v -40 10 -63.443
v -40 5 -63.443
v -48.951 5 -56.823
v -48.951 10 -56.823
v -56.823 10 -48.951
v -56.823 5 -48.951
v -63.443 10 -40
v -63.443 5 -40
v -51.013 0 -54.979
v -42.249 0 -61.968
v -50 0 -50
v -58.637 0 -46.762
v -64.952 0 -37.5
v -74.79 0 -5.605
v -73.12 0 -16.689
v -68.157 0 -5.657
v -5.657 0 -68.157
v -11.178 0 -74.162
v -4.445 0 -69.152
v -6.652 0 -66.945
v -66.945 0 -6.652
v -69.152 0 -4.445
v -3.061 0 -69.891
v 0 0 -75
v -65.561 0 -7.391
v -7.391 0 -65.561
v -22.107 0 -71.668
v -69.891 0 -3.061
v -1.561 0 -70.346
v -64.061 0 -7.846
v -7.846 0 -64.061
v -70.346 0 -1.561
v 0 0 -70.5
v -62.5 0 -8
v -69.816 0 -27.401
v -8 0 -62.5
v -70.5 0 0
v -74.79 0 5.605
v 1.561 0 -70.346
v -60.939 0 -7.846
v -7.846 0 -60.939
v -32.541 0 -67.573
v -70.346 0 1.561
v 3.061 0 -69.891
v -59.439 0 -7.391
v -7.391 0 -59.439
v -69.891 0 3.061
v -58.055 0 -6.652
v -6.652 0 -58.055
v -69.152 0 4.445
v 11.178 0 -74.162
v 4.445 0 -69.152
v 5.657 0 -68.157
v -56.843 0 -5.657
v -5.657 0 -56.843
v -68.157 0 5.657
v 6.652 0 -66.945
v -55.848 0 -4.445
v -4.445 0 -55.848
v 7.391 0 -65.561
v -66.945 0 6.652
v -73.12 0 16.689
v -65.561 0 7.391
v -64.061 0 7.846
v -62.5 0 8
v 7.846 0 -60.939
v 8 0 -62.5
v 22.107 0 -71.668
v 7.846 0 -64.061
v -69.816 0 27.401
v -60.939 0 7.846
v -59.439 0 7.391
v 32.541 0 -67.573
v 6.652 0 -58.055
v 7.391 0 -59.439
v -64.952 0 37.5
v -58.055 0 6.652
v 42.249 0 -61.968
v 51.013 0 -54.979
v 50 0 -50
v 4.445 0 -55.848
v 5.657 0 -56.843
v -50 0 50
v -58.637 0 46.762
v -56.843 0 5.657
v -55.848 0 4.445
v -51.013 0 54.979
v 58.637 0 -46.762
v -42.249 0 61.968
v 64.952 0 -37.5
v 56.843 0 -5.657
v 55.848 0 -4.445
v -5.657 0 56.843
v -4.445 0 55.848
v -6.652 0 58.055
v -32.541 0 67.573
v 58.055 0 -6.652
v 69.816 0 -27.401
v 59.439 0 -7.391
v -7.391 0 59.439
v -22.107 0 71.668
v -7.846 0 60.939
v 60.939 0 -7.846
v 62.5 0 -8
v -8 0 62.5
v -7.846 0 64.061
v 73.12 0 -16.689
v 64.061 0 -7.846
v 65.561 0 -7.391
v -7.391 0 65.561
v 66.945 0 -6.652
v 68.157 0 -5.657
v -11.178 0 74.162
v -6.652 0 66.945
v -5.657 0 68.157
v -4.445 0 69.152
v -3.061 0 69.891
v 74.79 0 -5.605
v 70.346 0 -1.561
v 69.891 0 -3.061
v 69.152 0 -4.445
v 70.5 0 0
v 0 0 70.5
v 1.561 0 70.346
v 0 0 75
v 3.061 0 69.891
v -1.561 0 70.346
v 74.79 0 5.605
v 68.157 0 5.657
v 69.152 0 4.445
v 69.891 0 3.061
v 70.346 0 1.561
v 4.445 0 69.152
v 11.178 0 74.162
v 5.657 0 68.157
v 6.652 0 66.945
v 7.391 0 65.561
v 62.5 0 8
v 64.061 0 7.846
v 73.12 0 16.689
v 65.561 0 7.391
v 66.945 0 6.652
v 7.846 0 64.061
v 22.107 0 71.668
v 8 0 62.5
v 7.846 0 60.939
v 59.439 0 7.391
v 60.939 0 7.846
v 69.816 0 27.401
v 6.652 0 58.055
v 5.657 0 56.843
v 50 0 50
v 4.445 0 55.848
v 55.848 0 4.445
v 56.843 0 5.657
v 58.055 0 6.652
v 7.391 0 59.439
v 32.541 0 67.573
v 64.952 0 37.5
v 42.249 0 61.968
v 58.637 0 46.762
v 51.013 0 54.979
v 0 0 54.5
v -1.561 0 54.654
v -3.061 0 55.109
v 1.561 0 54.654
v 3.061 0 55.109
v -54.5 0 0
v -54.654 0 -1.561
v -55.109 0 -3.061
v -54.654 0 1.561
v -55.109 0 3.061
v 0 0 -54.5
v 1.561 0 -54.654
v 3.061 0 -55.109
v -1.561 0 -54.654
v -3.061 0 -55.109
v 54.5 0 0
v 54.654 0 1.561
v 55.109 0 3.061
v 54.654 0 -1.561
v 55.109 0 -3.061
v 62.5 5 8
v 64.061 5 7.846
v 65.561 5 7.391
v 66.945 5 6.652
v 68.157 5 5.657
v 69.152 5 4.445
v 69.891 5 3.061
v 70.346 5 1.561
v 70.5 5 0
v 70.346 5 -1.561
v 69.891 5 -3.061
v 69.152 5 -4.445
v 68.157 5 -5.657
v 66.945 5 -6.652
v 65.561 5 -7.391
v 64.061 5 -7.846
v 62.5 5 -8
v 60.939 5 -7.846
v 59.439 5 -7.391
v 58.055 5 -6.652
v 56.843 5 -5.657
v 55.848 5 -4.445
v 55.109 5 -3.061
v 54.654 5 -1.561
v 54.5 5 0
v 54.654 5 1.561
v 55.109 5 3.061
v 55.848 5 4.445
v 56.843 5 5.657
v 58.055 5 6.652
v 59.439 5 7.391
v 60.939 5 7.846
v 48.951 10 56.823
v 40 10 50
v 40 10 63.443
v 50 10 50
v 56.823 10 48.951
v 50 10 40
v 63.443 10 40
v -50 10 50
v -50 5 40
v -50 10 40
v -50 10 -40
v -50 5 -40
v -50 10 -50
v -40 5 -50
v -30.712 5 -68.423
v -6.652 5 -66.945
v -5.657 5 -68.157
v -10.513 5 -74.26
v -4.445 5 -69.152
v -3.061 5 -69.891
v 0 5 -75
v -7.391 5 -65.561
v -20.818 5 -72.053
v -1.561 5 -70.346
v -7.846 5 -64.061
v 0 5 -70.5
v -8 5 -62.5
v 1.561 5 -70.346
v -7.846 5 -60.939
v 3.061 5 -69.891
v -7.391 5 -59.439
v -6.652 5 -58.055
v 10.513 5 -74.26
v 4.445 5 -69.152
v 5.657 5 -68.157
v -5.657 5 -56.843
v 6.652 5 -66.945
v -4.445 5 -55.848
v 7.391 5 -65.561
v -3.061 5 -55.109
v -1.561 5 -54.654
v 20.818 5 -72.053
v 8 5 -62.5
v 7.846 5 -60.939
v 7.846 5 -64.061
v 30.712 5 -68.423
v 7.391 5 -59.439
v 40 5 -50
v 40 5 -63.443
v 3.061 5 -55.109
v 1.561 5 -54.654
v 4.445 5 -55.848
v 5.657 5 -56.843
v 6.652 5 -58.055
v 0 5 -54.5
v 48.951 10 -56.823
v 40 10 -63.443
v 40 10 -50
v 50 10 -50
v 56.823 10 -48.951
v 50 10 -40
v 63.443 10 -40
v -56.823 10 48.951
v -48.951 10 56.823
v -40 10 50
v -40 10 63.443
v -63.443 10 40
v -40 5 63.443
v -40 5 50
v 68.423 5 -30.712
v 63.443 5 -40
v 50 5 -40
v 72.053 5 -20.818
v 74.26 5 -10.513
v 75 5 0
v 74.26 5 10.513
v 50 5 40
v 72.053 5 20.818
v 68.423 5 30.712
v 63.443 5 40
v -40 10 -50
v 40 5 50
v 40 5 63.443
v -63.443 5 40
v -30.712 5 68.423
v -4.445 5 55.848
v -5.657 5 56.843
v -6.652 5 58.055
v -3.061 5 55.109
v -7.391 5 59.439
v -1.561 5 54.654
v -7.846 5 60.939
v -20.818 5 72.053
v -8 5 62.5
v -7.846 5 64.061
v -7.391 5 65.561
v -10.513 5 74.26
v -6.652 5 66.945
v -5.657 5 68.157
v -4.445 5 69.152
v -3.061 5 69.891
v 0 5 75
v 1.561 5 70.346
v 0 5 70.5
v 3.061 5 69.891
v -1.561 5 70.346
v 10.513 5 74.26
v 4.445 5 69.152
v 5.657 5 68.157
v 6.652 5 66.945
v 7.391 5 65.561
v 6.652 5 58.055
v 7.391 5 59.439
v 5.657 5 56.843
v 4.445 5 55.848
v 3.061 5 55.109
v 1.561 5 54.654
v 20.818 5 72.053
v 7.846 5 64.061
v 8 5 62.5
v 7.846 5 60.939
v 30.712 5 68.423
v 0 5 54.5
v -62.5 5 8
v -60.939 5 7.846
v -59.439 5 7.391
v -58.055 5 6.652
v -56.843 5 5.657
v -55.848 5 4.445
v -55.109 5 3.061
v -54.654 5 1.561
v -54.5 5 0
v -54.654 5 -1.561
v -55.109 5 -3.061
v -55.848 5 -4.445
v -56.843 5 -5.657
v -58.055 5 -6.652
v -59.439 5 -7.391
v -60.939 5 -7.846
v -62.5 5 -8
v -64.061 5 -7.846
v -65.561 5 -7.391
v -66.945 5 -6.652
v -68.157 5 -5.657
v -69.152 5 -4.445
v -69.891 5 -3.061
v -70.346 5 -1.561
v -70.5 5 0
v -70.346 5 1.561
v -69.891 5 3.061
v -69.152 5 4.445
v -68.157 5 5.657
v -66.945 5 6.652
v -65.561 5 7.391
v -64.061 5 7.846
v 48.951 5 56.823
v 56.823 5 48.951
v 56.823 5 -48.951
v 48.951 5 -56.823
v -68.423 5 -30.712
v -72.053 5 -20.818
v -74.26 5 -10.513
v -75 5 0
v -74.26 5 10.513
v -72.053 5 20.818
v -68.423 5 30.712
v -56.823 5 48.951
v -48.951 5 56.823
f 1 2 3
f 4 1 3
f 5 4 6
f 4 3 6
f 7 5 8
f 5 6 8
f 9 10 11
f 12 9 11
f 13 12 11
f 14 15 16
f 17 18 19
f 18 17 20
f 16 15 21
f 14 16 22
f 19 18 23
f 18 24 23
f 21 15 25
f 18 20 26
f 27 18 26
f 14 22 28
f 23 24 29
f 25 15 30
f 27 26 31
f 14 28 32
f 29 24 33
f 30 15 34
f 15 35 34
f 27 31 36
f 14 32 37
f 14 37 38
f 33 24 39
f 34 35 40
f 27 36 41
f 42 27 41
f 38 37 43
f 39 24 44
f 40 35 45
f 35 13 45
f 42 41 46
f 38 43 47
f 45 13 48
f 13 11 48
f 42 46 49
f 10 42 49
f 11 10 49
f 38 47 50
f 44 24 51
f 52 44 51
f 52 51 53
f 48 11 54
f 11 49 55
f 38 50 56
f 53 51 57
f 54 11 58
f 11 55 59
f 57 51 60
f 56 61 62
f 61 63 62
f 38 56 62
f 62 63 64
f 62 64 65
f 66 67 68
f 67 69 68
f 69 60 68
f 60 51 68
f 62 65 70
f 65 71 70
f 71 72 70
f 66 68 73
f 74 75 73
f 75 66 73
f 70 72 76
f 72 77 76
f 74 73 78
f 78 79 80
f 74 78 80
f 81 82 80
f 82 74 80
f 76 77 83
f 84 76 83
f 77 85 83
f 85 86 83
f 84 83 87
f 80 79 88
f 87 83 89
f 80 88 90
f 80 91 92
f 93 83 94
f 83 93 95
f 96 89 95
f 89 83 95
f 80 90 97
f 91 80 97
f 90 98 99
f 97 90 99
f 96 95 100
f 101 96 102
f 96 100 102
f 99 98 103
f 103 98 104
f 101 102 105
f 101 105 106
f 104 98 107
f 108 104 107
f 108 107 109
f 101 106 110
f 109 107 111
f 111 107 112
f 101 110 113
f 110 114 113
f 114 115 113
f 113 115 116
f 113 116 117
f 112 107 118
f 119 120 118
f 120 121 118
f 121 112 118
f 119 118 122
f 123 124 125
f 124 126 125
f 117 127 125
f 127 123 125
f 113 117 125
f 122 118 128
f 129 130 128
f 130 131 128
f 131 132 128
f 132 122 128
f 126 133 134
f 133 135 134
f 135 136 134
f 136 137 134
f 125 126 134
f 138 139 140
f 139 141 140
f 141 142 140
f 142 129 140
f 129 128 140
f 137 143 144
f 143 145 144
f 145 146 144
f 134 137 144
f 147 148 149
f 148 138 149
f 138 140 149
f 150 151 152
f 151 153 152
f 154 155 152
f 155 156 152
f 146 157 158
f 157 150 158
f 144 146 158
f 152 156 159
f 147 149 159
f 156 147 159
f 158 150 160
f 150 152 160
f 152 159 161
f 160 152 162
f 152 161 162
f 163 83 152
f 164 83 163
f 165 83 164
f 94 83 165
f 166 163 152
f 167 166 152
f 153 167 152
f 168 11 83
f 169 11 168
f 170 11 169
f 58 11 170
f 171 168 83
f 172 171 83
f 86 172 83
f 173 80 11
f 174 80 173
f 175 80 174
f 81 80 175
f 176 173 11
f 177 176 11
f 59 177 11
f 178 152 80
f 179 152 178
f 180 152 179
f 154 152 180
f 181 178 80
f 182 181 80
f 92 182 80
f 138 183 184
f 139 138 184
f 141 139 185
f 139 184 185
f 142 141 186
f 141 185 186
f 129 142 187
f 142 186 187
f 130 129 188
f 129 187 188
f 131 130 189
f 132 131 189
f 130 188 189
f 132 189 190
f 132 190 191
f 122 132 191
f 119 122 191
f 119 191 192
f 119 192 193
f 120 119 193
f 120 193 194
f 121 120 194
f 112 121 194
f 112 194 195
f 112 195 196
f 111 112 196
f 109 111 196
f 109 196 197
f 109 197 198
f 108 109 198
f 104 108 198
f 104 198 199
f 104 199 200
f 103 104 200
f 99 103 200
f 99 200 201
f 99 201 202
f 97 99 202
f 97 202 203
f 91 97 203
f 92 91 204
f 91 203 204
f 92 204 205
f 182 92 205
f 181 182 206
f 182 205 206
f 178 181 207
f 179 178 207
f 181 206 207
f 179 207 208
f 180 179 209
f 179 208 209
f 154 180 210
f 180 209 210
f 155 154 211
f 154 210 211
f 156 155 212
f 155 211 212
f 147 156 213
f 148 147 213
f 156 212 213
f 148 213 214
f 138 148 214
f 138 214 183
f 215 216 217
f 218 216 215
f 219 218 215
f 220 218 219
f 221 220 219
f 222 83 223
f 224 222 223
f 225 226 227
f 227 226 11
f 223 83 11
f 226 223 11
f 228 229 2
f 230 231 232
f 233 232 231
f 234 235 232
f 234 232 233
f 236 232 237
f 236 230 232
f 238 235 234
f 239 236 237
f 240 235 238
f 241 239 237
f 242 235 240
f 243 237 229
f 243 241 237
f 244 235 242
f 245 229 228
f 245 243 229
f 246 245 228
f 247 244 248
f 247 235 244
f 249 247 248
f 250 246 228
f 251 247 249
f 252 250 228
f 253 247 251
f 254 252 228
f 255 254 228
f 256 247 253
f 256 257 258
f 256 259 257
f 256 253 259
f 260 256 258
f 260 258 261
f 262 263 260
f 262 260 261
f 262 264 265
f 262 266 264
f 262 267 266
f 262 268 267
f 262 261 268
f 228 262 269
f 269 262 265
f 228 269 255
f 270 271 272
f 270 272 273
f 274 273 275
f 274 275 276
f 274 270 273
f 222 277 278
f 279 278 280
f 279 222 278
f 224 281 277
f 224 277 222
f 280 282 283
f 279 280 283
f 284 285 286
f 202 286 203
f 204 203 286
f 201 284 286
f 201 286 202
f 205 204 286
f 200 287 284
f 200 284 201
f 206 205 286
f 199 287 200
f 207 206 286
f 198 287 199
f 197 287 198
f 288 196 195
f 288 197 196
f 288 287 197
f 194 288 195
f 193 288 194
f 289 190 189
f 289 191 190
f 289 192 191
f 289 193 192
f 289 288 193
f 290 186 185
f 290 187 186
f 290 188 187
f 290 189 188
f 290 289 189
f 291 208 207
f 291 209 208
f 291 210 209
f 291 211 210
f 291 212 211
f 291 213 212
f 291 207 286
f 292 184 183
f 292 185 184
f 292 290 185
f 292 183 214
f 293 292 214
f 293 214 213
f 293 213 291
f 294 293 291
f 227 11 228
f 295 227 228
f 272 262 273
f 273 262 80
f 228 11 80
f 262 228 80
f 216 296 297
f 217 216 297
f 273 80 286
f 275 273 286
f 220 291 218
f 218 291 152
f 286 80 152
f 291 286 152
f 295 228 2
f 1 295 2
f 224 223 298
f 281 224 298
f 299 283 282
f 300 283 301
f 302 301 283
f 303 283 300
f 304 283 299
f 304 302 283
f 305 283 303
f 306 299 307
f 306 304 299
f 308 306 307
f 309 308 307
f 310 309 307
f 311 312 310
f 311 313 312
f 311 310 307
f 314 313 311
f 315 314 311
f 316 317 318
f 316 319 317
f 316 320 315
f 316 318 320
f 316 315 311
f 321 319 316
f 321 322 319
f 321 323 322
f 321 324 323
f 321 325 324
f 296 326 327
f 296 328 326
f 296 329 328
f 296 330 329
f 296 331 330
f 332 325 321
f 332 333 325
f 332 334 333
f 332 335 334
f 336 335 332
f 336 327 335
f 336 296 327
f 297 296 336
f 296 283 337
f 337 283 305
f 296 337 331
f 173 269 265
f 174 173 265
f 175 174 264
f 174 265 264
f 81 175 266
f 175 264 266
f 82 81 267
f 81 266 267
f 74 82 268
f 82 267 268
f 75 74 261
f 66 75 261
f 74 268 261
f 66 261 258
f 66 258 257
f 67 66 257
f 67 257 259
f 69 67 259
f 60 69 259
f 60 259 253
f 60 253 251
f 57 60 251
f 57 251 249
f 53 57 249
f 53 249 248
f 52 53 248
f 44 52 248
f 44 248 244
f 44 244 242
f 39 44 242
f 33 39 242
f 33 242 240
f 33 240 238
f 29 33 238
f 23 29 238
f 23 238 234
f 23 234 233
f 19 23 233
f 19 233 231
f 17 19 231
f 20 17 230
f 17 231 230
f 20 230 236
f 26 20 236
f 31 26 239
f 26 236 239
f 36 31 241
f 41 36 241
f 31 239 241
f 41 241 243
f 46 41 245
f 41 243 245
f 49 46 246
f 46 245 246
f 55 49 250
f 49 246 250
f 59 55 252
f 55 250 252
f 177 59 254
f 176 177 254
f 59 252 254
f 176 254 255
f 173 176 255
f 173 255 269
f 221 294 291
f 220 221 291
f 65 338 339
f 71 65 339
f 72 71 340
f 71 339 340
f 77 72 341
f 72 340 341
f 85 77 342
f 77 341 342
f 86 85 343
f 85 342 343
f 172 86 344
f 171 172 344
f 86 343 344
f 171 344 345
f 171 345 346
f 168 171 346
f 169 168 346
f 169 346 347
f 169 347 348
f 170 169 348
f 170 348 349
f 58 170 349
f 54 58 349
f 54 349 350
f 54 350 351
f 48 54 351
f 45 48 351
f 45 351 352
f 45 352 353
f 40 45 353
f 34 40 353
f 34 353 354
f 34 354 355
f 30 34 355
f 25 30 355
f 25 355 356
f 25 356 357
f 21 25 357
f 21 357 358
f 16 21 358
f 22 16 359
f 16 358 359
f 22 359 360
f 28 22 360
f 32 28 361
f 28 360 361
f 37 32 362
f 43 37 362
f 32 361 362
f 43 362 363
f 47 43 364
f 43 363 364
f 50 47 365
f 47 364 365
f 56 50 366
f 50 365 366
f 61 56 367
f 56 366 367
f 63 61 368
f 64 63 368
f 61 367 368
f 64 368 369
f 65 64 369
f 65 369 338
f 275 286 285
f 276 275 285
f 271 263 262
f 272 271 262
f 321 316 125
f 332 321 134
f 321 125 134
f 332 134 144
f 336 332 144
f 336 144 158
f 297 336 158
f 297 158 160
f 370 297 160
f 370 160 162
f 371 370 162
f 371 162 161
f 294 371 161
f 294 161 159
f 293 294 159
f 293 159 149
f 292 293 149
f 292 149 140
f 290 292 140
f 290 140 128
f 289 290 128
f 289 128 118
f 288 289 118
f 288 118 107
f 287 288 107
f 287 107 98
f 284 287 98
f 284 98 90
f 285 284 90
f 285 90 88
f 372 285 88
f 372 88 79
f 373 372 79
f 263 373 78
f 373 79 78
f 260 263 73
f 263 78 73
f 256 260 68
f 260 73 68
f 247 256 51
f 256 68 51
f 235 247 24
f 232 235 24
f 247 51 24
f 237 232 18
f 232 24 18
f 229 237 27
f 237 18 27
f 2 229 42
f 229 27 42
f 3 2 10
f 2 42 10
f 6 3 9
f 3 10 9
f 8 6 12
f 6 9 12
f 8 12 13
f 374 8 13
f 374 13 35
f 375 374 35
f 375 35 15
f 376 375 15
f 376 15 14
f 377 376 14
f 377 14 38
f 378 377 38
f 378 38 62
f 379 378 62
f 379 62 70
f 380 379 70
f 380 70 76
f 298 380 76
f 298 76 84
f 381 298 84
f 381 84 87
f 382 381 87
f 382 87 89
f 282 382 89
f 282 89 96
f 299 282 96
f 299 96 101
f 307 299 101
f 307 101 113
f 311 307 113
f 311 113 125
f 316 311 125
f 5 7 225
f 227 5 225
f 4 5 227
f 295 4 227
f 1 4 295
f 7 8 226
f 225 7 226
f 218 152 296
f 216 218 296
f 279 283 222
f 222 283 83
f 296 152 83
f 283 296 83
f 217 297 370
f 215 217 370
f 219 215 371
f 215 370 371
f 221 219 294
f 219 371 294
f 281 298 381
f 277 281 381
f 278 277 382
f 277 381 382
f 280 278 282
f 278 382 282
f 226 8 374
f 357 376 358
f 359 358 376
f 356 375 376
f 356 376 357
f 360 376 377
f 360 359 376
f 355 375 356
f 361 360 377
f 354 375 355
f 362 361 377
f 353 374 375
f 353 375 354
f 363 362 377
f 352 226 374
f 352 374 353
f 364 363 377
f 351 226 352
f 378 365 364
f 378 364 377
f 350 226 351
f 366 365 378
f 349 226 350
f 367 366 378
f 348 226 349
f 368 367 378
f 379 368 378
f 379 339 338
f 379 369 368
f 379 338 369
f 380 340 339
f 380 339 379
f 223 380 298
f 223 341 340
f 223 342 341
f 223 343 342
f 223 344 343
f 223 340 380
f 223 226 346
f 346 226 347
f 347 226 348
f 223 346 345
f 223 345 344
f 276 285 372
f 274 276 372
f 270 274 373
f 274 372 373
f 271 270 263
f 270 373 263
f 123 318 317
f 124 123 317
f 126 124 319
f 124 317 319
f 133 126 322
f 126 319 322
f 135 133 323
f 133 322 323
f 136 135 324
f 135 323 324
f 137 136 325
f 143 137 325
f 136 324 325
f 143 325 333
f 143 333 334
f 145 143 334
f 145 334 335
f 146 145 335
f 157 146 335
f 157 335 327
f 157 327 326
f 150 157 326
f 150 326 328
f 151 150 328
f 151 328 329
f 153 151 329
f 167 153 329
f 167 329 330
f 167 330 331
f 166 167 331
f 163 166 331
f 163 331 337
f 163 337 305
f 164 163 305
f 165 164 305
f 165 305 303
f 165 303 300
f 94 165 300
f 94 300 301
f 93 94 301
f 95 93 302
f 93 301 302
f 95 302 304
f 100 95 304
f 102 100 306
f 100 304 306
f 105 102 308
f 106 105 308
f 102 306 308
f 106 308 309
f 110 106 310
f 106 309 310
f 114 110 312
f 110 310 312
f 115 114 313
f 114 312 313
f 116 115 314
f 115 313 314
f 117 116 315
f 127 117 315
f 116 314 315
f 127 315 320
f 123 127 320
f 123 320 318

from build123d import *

# Parameters (mm, degrees)
SKETCH1_R           = 75
SKETCH1_W           = 100
SKETCH1_H           = 100
BOSS_EXTRUDE1_DEPTH = 5
SKETCH2_R           = 8
CUT_EXTRUDE1_DEPTH  = 10
BOSS_EXTRUDE2_DEPTH = 5


with BuildPart() as part:
    # Sketch1 → Boss-Extrude1 (new body)
    with BuildSketch(Plane(origin=(0, 0, 0), x_dir=(1, 0, 0), z_dir=(0, 1, 0))):
        with Locations(Location((0, 0, 0), (0, 0, 270))):
            Circle(SKETCH1_R)
        Rectangle(SKETCH1_W, SKETCH1_H, mode=Mode.SUBTRACT)
    extrude(amount=BOSS_EXTRUDE1_DEPTH)

    # Sketch2 → Cut-Extrude1 (cut)
    with BuildSketch(Plane(origin=(0, 5, 0), x_dir=(1, 0, 0), z_dir=(0, 1, 0))):
        with Locations(Location((-62.5, 0, 0), (0, 0, 270))):
            Circle(SKETCH2_R)
        with Locations(Location((0, 62.5, 0), (0, 0, 270))):
            Circle(SKETCH2_R)
        with Locations(Location((62.5, 0, 0), (0, 0, 270))):
            Circle(SKETCH2_R)
        with Locations(Location((0, -62.5, 0), (0, 0, 270))):
            Circle(SKETCH2_R)
    extrude(amount=-CUT_EXTRUDE1_DEPTH, mode=Mode.SUBTRACT)

    # Sketch3 → Boss-Extrude2 (add)
    with BuildSketch(Plane(origin=(0, 5, 0), x_dir=(1, 0, 0), z_dir=(0, 1, 0))):
        with BuildLine():
            Line((50, -50), (40, -50))
            Line((40, -50), (40, -63.442887702))
            ThreePointArc((40, -63.442887702), (53.033008589, -53.033008589), (63.442887702, -40))
            Line((63.442887702, -40), (50, -40))
            Line((50, -40), (50, -50))
        make_face()
        with BuildLine():
            Line((-40, -50), (-50, -50))
            Line((-50, -50), (-50, -40))
            Line((-50, -40), (-63.442887702, -40))
            ThreePointArc((-63.442887702, -40), (-53.033008589, -53.033008589), (-40, -63.442887702))
            Line((-40, -63.442887702), (-40, -50))
        make_face()
        with BuildLine():
            Line((-63.442887702, 40), (-50, 40))
            Line((-50, 40), (-50, 50))
            Line((-50, 50), (-40, 50))
            Line((-40, 50), (-40, 63.442887702))
            ThreePointArc((-40, 63.442887702), (-53.033008589, 53.033008589), (-63.442887702, 40))
        make_face()
        with BuildLine():
            Line((50, 50), (50, 40))
            Line((50, 40), (63.442887702, 40))
            ThreePointArc((63.442887702, 40), (53.033008589, 53.033008589), (40, 63.442887702))
            Line((40, 63.442887702), (40, 50))
            Line((40, 50), (50, 50))
        make_face()
    extrude(amount=BOSS_EXTRUDE2_DEPTH)


solid = part.part
